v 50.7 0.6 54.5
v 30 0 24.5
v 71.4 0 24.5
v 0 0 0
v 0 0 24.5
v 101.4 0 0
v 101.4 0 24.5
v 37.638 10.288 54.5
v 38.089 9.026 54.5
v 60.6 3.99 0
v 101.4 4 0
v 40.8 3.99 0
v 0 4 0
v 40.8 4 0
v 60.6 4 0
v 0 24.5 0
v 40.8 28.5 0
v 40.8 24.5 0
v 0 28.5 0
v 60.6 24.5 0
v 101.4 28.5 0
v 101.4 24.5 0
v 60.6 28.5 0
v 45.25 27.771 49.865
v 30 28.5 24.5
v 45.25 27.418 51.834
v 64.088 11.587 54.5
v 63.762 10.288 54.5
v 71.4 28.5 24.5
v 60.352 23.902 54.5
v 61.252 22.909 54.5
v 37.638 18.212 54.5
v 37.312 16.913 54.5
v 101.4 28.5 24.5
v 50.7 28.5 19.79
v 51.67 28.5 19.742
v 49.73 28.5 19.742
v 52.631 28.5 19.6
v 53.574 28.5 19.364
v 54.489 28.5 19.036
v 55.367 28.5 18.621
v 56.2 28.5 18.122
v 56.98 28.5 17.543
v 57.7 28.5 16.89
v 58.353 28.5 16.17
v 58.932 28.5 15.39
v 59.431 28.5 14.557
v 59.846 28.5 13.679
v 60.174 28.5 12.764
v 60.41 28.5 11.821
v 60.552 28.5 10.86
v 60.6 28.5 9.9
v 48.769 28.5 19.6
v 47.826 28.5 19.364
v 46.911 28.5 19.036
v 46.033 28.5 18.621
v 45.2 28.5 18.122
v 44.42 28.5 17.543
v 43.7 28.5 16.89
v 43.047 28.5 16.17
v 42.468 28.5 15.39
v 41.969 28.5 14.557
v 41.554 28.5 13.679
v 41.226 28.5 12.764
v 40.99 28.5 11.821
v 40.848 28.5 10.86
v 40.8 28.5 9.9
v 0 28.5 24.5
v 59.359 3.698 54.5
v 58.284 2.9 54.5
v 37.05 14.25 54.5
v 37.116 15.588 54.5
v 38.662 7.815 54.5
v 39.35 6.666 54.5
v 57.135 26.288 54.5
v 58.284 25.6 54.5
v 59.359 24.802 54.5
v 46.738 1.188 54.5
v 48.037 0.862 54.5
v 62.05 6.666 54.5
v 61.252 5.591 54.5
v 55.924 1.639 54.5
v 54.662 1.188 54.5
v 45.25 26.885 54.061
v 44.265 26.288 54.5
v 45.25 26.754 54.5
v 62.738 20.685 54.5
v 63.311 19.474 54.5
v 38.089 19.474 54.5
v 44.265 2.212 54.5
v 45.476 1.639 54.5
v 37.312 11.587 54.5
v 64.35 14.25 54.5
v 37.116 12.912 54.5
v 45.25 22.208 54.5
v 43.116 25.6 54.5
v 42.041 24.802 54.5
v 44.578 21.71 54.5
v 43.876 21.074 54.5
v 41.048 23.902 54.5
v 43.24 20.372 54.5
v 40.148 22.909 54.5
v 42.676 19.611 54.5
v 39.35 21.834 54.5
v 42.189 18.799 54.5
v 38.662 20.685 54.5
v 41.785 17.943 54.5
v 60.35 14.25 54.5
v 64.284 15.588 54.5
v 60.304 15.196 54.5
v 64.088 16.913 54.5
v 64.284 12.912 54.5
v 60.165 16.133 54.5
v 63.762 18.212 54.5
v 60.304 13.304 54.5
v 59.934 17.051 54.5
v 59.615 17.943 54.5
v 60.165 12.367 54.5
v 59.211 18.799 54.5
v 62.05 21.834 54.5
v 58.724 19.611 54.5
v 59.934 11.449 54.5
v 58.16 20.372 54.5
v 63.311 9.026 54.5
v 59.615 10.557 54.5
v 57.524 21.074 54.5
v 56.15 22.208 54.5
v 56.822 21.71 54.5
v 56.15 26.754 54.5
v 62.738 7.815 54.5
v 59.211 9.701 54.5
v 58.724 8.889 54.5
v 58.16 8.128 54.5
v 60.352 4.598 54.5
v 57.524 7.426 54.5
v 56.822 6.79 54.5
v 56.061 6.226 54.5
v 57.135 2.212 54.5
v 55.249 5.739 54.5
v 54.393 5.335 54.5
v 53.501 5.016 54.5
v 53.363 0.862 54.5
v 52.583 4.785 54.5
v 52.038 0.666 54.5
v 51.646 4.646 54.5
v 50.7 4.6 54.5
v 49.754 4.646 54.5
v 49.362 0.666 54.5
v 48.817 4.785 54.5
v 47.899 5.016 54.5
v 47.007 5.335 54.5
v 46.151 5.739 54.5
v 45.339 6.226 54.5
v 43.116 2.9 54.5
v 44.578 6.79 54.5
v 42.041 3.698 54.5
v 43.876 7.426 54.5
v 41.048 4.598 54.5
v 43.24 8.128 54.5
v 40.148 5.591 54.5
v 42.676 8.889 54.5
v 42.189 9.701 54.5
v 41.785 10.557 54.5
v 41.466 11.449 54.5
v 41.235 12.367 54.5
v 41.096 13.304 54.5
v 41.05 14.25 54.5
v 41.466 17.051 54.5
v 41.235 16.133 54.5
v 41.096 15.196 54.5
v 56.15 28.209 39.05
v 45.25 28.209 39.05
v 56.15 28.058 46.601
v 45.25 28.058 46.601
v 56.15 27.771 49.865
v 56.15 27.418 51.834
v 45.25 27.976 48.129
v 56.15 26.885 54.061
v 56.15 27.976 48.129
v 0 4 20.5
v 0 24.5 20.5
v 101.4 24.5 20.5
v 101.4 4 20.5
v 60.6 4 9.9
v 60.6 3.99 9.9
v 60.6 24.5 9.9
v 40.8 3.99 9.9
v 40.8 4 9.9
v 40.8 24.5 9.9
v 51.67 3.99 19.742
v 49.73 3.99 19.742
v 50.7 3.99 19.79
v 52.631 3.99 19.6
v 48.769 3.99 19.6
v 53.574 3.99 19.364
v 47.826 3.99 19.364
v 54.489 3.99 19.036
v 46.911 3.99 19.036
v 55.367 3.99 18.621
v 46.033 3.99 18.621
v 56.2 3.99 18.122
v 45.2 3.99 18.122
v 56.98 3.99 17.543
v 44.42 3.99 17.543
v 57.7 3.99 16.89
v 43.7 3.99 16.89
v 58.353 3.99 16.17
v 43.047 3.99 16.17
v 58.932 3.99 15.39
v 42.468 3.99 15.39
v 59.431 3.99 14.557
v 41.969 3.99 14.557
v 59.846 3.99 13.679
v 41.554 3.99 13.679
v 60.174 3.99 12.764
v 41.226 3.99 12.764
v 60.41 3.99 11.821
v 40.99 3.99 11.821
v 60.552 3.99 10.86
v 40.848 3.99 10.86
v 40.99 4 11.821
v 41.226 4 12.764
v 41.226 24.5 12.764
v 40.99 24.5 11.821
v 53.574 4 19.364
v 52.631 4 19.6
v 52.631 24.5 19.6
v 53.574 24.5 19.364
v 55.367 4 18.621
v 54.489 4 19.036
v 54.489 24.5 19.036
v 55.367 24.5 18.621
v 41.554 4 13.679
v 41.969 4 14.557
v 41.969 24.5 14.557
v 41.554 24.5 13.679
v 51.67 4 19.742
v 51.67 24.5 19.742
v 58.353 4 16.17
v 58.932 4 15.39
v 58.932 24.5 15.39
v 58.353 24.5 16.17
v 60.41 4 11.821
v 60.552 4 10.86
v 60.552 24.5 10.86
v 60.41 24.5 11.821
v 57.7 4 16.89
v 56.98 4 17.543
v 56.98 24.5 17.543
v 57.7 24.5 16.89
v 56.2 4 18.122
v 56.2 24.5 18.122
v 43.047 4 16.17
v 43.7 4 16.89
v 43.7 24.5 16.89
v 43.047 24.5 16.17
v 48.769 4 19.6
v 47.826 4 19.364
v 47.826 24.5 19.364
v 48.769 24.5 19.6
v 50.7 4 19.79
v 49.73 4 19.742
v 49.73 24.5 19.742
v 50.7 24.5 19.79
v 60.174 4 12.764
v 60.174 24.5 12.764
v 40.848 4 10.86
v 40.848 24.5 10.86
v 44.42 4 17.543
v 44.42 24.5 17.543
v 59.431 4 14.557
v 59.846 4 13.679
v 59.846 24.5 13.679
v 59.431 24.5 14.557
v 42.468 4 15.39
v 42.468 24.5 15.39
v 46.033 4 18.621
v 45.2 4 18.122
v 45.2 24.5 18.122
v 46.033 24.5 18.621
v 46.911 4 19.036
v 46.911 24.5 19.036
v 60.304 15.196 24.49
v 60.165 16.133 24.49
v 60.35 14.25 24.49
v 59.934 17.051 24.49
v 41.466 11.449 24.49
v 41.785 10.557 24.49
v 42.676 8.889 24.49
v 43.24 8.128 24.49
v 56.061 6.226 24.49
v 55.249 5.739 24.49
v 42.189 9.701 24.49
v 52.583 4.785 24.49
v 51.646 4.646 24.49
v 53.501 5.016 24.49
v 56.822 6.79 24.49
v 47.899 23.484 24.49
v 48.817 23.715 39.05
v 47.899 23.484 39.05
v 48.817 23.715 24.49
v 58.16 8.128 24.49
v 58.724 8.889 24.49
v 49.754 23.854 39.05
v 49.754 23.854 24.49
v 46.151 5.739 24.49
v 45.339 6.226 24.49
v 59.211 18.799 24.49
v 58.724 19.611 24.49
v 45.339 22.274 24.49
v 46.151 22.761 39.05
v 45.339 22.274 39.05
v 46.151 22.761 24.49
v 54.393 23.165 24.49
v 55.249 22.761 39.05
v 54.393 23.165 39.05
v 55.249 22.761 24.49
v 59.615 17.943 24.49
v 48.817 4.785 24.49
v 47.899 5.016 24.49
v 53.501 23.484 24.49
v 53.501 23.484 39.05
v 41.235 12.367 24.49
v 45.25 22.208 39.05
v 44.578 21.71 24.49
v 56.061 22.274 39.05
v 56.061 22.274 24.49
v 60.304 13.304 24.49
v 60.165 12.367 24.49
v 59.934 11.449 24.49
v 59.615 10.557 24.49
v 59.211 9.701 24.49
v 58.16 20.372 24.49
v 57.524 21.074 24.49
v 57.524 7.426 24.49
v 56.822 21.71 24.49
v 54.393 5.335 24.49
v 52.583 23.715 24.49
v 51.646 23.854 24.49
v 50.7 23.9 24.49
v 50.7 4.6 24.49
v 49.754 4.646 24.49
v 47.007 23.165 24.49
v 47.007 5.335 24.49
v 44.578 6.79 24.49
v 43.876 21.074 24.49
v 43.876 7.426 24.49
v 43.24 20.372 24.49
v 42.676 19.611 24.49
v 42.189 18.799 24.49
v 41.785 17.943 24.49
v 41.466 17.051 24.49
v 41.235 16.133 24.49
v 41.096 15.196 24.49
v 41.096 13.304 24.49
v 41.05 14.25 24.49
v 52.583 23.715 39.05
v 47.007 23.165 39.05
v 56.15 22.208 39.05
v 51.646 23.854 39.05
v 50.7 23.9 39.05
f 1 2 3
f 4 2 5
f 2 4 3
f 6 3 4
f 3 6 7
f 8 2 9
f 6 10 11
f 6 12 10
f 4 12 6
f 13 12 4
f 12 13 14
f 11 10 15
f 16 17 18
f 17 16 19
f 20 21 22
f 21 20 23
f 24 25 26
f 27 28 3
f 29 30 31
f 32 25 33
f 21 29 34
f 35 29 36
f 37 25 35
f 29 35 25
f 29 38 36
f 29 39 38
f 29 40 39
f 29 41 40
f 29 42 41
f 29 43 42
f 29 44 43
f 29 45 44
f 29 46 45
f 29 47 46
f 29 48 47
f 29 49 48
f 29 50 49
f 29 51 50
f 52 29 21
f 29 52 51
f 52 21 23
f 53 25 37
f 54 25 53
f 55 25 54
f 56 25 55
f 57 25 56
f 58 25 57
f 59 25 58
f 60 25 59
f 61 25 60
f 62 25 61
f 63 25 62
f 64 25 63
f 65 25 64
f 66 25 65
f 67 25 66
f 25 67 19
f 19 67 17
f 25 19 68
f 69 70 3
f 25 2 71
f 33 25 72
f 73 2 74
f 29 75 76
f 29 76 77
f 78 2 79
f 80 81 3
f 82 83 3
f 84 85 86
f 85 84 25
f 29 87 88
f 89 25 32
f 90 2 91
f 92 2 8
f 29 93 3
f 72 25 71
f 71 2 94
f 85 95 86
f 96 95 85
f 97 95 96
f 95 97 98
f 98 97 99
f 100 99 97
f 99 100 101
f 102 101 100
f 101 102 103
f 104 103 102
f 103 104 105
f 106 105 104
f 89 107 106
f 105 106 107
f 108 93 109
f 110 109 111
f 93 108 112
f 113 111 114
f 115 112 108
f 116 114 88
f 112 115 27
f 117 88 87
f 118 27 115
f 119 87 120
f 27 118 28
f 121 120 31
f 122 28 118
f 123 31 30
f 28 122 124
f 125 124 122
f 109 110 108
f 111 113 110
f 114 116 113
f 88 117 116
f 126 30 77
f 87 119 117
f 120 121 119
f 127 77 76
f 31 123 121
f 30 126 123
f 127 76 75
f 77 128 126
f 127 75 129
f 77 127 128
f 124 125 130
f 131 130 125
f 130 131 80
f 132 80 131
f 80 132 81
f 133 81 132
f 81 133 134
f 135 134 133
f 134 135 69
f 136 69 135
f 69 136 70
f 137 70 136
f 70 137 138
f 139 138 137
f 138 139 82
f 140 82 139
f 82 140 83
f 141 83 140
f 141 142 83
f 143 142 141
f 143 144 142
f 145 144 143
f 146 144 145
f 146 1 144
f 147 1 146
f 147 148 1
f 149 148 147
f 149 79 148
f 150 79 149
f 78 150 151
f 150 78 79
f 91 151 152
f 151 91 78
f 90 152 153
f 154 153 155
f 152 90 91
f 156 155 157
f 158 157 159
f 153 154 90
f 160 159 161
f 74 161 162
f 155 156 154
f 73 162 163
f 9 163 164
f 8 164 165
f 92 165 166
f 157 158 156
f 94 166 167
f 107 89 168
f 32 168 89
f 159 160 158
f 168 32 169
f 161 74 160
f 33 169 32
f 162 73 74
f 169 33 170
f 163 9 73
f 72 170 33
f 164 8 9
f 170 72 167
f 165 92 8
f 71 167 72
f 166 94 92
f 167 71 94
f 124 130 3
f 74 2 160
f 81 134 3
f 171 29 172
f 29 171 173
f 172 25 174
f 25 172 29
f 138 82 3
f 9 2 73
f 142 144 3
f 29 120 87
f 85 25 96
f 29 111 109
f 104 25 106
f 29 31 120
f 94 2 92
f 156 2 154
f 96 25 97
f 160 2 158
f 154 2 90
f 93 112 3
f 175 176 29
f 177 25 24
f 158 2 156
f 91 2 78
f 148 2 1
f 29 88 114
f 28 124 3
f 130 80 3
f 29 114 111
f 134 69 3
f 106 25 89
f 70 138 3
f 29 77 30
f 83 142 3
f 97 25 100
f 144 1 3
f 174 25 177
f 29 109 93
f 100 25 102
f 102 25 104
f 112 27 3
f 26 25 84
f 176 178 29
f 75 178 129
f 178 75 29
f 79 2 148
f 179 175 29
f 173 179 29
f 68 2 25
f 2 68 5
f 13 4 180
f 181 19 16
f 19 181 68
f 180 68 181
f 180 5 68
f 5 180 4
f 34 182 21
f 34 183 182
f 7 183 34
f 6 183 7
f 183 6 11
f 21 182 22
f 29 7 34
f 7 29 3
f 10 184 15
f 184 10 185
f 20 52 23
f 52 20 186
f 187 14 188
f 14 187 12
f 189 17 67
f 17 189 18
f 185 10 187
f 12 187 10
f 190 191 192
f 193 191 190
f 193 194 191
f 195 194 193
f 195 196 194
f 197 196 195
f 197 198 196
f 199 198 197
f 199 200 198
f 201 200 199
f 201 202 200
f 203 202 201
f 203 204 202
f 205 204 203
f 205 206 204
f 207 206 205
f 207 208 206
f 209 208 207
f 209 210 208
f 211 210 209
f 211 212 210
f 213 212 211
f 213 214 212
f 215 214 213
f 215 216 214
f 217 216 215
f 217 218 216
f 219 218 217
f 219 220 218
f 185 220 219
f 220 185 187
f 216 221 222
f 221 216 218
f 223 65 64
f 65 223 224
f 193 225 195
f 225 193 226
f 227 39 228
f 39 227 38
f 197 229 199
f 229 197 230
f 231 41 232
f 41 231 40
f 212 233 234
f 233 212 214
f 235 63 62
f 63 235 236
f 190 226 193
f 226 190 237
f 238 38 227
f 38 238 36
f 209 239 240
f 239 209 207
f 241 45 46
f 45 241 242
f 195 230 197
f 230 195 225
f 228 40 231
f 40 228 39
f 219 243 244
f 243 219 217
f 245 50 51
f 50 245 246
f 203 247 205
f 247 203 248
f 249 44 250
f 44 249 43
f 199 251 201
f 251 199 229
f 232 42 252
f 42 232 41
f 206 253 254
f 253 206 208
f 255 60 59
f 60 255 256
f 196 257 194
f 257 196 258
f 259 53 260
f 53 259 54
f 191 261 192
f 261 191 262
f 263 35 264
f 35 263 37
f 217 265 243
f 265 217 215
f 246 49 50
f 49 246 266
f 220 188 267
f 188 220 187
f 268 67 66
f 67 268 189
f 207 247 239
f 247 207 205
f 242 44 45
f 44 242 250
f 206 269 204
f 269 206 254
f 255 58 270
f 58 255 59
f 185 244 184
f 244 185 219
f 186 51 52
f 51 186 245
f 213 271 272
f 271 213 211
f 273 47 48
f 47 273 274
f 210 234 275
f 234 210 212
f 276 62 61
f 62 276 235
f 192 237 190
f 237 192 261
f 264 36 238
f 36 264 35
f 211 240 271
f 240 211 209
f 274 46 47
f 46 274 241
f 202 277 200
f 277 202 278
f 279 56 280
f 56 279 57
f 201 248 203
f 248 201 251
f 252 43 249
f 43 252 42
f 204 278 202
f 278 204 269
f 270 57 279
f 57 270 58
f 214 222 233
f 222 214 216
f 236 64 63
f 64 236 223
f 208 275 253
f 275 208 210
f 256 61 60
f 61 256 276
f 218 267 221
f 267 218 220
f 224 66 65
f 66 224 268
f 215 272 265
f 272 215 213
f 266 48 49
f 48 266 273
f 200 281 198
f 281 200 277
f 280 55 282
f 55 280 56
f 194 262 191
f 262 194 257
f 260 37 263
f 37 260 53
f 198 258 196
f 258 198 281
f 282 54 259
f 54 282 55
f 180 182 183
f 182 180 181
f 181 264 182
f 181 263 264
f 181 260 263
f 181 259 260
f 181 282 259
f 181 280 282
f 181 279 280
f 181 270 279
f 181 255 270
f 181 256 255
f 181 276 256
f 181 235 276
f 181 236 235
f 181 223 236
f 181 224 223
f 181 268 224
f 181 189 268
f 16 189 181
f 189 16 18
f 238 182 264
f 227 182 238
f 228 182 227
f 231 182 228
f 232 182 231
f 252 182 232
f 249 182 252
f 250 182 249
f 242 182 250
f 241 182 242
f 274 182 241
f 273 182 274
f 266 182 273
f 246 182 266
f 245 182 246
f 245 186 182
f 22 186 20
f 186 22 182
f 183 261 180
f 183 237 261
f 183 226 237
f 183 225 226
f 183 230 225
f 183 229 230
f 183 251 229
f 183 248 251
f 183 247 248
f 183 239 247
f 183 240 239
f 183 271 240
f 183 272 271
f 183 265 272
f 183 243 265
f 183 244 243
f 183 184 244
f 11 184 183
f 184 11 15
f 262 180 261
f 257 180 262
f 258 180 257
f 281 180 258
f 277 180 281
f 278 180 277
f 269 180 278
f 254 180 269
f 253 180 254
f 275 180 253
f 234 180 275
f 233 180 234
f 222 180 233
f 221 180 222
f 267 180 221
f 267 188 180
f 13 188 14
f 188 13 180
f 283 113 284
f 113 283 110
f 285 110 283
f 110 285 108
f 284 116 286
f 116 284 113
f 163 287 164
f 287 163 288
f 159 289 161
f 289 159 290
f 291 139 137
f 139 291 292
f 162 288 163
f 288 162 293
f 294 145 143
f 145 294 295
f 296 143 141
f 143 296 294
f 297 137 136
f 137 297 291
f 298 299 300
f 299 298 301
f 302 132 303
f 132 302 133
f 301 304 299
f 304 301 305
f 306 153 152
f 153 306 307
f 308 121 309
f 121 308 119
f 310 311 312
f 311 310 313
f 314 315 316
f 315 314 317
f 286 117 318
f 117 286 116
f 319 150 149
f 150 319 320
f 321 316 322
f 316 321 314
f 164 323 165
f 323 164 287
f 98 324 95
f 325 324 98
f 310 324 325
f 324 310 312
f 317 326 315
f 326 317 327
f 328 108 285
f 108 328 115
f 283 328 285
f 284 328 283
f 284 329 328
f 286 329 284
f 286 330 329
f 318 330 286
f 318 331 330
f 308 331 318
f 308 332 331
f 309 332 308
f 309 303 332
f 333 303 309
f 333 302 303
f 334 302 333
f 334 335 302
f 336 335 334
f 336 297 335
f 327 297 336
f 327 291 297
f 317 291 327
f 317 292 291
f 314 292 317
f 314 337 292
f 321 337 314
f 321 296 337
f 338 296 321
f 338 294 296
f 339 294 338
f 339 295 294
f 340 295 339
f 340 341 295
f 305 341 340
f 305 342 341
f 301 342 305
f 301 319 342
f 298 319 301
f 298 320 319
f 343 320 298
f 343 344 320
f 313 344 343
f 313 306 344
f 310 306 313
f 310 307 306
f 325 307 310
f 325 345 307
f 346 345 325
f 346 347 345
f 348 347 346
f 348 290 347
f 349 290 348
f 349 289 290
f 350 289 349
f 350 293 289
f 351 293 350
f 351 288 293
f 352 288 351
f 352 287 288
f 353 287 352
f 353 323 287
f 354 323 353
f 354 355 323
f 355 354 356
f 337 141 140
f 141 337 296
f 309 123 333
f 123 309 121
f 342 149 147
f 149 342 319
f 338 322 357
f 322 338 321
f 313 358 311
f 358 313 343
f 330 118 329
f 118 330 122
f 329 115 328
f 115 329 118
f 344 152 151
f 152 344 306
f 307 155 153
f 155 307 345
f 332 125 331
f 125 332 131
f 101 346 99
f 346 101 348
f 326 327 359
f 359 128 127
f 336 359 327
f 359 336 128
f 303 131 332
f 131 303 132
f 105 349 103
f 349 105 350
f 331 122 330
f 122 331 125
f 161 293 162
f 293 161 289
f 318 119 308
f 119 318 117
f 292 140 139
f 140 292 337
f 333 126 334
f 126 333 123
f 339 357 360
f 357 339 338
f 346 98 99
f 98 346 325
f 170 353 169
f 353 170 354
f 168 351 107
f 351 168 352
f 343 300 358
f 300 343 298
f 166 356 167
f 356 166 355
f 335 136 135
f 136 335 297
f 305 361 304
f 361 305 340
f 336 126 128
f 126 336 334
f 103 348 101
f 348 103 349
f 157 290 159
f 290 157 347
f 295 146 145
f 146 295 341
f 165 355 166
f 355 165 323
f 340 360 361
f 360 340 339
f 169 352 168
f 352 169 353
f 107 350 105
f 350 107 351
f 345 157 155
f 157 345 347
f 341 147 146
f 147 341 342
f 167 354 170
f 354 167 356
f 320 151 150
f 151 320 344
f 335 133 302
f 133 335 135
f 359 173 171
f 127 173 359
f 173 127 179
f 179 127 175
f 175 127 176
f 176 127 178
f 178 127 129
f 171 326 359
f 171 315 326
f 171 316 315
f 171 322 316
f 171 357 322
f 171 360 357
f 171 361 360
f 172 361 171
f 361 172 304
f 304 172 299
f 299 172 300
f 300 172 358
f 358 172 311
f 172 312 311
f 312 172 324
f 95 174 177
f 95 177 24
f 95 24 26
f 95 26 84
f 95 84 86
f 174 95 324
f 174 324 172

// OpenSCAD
// file: ../lib/common.scad
// ─── common.scad ─────────────────────────────────────────────────────────────
// Shared utility modules for the 3D model project.
// Include with:  include <../lib/common.scad>
// ─────────────────────────────────────────────────────────────────────────────

$fn = 64; // global circle/sphere smoothness

// ── Rounded box ──────────────────────────────────────────────────────────────
// w/d/h = outer dimensions, r = corner radius
module rounded_box(w, d, h, r = 2) {
    hull() {
        for (x = [r, w - r])
        for (y = [r, d - r])
            translate([x, y, 0])
                cylinder(r = r, h = h);
    }
}

// ── Rounded box with optional hollow interior ─────────────────────────────────
// wall = wall thickness; set to 0 for a solid block
module box_shell(w, d, h, r = 2, wall = 1.5) {
    if (wall <= 0) {
        rounded_box(w, d, h, r);
    } else {
        difference() {
            rounded_box(w, d, h, r);
            translate([wall, wall, wall])
                rounded_box(w - wall*2, d - wall*2, h, max(r - wall, 0.1));
        }
    }
}

// ── Countersunk hole (for M-series screws) ────────────────────────────────────
// d_shaft = shaft diameter, d_head = countersink diameter, depth = head depth
module countersink(d_shaft, d_head, depth, h_total) {
    union() {
        cylinder(d = d_shaft, h = h_total);
        cylinder(d1 = d_head, d2 = d_shaft, h = depth);
    }
}

// ── Slot (oblong hole) ────────────────────────────────────────────────────────
// len = total length along X, w = width, h = depth
module slot(len, w, h) {
    r = w / 2;
    hull() {
        translate([r, 0, 0]) cylinder(r = r, h = h);
        translate([len - r, 0, 0]) cylinder(r = r, h = h);
    }
}

// ── Snap-fit clip (cantilever, +X direction) ─────────────────────────────────
// arm_l/w/h = arm dimensions, tip_h = tip protrusion
module snap_clip(arm_l = 10, arm_w = 4, arm_h = 1.5, tip_h = 1) {
    cube([arm_l, arm_w, arm_h]);
    translate([arm_l - tip_h, 0, arm_h])
        cube([tip_h, arm_w, tip_h]);
}

// ── Text label (recessed) ─────────────────────────────────────────────────────
// Use inside a difference(). t = text string, s = font size, depth = recess
module label(t, s = 5, depth = 0.5) {
    linear_extrude(depth)
        text(t, size = s, halign = "center", valign = "center");
}
// main file
// ─── tube_support_clamp.scad ──────────────────────────────────────────────────
// Saddle bracket that presses DOWN onto a square bar (lying flat, running in X).
// Round tube socket rises from the top centre.
// Coordinate convention matches the bar:
//   X = along bar length (bracket straddles this)
//   Y = bar depth  (20.7 mm)
//   Z = bar height (20.7 mm) — bracket presses down over this
//
// Print orientation: upside-down (socket pointing at build plate).
// ─────────────────────────────────────────────────────────────────────────────

include <../lib/common.scad>

// ── Parameters ────────────────────────────────────────────────────────────────

WALL = 4;                    // wall thickness (mm)

// Square bar cross-section  — -0.2 mm interference on each bore dimension
BAR_Y          = 20.7;       // bar depth  (Y)
BAR_Z          = 20.7;       // bar height (Z)
BORE_Y         = BAR_Y - 0.2;
BORE_Z         = BAR_Z - 0.2;

// Central hull width (socket diameter + walls each side)
GRIP_X         = BAR_Y * 2;  // core width around socket
// Wing extensions — extra grip length on each X side beyond the core
WING_X         = 30;

// Round vertical tube — -0.2 mm interference press fit
TUBE_OD        = 19.5;
TUBE_BORE      = TUBE_OD - 0.2;
SOCKET_DEPTH   = 30;         // insertion depth of round tube

// Squared nut (inside round socket, locks tube)
NUT_W          = 10.3;
NUT_THICK      = 5;
NUT_FROM_FLOOR = 20;         // distance from socket floor to nut centre
NUT_SLOT_W     = NUT_W + 0.6;
NUT_SLOT_T     = NUT_THICK + 0.4;

// Wing screw shaft clearance
SCREW_D        = 5;

// ── Derived ───────────────────────────────────────────────────────────────────

// Core saddle (around socket)
SADDLE_X  = GRIP_X;
SADDLE_Y  = BORE_Y + WALL * 2;
SADDLE_Z  = BORE_Z + WALL;       // WALL roof + bar height (open at bottom)

// Full width including wings
TOTAL_X   = SADDLE_X + WING_X * 2;

SOCKET_OD = TUBE_BORE + WALL * 2;

// Socket centre — offset by WING_X so it stays centred on TOTAL_X
CX = WING_X + SADDLE_X / 2;
CY = SADDLE_Y / 2;

// ── Body — central hull + flat wings on each X side ───────────────────────────
module body() {
    union() {
        // central hull: tapers from core saddle block up to socket cylinder
        translate([WING_X, 0, 0])
            hull() {
                cube([SADDLE_X, SADDLE_Y, SADDLE_Z]);
                translate([SADDLE_X / 2, CY, SADDLE_Z])
                    cylinder(d = SOCKET_OD, h = SOCKET_DEPTH);
            }
        // left wing — flat saddle slab, same Y and Z as core
        cube([WING_X, SADDLE_Y, SADDLE_Z]);
        // right wing
        translate([WING_X + SADDLE_X, 0, 0])
            cube([WING_X, SADDLE_Y, SADDLE_Z]);
    }
}

// ── Bar channel — U-slot spanning full width including wings ──────────────────
module bar_channel() {
    translate([-0.01, WALL, -0.01])
        cube([TOTAL_X + 0.02, BORE_Y, BORE_Z + 0.01]);
}

// ── Front tube opening — arch slot through front wall only ────────────────────
// Starts at Y=WALL (inner face of front wall) and exits at Y=SADDLE_Y (outer face).
// Leaves the back wall (Y=0 to Y=WALL) intact.
// Open at Z=0 so the tube slides in from below.
module front_tube_opening() {
    tube_r = (TUBE_OD + 0.3) / 2;
    // cut depth = from inner face of front wall to outside
    cut_depth = SADDLE_Y - WALL + 0.02;
    translate([CX, WALL - 0.01, -0.01]) {
        // rectangular stem from bottom up to arch start
        translate([-tube_r, 0, 0])
            cube([tube_r * 2, cut_depth, tube_r + 0.01]);
        // arched top
        translate([0, 0, tube_r])
            rotate([-90, 0, 0])
                cylinder(r = tube_r, h = cut_depth);
    }
}

// ── Round tube socket bore ────────────────────────────────────────────────────
module round_bore() {
    translate([CX, CY, SADDLE_Z - 0.01])
        cylinder(d = TUBE_BORE, h = SOCKET_DEPTH + 0.02);
}

// ── Nut slot — from socket top down to nut position ───────────────────────────
// Tube and nut insert from above; slot gives clearance from top to nut centre.
module nut_slot() {
    slot_bottom = SADDLE_Z + NUT_FROM_FLOOR - NUT_SLOT_W / 2;
    slot_top    = SADDLE_Z + SOCKET_DEPTH + 0.02;
    translate([CX - NUT_SLOT_W / 2, CY - NUT_SLOT_T / 2, slot_bottom])
        cube([NUT_SLOT_W, SOCKET_OD, slot_top - slot_bottom]);
}

// ── Assembly ──────────────────────────────────────────────────────────────────
difference() {
    body();
    bar_channel();
    front_tube_opening();
    round_bore();
    nut_slot();
}
